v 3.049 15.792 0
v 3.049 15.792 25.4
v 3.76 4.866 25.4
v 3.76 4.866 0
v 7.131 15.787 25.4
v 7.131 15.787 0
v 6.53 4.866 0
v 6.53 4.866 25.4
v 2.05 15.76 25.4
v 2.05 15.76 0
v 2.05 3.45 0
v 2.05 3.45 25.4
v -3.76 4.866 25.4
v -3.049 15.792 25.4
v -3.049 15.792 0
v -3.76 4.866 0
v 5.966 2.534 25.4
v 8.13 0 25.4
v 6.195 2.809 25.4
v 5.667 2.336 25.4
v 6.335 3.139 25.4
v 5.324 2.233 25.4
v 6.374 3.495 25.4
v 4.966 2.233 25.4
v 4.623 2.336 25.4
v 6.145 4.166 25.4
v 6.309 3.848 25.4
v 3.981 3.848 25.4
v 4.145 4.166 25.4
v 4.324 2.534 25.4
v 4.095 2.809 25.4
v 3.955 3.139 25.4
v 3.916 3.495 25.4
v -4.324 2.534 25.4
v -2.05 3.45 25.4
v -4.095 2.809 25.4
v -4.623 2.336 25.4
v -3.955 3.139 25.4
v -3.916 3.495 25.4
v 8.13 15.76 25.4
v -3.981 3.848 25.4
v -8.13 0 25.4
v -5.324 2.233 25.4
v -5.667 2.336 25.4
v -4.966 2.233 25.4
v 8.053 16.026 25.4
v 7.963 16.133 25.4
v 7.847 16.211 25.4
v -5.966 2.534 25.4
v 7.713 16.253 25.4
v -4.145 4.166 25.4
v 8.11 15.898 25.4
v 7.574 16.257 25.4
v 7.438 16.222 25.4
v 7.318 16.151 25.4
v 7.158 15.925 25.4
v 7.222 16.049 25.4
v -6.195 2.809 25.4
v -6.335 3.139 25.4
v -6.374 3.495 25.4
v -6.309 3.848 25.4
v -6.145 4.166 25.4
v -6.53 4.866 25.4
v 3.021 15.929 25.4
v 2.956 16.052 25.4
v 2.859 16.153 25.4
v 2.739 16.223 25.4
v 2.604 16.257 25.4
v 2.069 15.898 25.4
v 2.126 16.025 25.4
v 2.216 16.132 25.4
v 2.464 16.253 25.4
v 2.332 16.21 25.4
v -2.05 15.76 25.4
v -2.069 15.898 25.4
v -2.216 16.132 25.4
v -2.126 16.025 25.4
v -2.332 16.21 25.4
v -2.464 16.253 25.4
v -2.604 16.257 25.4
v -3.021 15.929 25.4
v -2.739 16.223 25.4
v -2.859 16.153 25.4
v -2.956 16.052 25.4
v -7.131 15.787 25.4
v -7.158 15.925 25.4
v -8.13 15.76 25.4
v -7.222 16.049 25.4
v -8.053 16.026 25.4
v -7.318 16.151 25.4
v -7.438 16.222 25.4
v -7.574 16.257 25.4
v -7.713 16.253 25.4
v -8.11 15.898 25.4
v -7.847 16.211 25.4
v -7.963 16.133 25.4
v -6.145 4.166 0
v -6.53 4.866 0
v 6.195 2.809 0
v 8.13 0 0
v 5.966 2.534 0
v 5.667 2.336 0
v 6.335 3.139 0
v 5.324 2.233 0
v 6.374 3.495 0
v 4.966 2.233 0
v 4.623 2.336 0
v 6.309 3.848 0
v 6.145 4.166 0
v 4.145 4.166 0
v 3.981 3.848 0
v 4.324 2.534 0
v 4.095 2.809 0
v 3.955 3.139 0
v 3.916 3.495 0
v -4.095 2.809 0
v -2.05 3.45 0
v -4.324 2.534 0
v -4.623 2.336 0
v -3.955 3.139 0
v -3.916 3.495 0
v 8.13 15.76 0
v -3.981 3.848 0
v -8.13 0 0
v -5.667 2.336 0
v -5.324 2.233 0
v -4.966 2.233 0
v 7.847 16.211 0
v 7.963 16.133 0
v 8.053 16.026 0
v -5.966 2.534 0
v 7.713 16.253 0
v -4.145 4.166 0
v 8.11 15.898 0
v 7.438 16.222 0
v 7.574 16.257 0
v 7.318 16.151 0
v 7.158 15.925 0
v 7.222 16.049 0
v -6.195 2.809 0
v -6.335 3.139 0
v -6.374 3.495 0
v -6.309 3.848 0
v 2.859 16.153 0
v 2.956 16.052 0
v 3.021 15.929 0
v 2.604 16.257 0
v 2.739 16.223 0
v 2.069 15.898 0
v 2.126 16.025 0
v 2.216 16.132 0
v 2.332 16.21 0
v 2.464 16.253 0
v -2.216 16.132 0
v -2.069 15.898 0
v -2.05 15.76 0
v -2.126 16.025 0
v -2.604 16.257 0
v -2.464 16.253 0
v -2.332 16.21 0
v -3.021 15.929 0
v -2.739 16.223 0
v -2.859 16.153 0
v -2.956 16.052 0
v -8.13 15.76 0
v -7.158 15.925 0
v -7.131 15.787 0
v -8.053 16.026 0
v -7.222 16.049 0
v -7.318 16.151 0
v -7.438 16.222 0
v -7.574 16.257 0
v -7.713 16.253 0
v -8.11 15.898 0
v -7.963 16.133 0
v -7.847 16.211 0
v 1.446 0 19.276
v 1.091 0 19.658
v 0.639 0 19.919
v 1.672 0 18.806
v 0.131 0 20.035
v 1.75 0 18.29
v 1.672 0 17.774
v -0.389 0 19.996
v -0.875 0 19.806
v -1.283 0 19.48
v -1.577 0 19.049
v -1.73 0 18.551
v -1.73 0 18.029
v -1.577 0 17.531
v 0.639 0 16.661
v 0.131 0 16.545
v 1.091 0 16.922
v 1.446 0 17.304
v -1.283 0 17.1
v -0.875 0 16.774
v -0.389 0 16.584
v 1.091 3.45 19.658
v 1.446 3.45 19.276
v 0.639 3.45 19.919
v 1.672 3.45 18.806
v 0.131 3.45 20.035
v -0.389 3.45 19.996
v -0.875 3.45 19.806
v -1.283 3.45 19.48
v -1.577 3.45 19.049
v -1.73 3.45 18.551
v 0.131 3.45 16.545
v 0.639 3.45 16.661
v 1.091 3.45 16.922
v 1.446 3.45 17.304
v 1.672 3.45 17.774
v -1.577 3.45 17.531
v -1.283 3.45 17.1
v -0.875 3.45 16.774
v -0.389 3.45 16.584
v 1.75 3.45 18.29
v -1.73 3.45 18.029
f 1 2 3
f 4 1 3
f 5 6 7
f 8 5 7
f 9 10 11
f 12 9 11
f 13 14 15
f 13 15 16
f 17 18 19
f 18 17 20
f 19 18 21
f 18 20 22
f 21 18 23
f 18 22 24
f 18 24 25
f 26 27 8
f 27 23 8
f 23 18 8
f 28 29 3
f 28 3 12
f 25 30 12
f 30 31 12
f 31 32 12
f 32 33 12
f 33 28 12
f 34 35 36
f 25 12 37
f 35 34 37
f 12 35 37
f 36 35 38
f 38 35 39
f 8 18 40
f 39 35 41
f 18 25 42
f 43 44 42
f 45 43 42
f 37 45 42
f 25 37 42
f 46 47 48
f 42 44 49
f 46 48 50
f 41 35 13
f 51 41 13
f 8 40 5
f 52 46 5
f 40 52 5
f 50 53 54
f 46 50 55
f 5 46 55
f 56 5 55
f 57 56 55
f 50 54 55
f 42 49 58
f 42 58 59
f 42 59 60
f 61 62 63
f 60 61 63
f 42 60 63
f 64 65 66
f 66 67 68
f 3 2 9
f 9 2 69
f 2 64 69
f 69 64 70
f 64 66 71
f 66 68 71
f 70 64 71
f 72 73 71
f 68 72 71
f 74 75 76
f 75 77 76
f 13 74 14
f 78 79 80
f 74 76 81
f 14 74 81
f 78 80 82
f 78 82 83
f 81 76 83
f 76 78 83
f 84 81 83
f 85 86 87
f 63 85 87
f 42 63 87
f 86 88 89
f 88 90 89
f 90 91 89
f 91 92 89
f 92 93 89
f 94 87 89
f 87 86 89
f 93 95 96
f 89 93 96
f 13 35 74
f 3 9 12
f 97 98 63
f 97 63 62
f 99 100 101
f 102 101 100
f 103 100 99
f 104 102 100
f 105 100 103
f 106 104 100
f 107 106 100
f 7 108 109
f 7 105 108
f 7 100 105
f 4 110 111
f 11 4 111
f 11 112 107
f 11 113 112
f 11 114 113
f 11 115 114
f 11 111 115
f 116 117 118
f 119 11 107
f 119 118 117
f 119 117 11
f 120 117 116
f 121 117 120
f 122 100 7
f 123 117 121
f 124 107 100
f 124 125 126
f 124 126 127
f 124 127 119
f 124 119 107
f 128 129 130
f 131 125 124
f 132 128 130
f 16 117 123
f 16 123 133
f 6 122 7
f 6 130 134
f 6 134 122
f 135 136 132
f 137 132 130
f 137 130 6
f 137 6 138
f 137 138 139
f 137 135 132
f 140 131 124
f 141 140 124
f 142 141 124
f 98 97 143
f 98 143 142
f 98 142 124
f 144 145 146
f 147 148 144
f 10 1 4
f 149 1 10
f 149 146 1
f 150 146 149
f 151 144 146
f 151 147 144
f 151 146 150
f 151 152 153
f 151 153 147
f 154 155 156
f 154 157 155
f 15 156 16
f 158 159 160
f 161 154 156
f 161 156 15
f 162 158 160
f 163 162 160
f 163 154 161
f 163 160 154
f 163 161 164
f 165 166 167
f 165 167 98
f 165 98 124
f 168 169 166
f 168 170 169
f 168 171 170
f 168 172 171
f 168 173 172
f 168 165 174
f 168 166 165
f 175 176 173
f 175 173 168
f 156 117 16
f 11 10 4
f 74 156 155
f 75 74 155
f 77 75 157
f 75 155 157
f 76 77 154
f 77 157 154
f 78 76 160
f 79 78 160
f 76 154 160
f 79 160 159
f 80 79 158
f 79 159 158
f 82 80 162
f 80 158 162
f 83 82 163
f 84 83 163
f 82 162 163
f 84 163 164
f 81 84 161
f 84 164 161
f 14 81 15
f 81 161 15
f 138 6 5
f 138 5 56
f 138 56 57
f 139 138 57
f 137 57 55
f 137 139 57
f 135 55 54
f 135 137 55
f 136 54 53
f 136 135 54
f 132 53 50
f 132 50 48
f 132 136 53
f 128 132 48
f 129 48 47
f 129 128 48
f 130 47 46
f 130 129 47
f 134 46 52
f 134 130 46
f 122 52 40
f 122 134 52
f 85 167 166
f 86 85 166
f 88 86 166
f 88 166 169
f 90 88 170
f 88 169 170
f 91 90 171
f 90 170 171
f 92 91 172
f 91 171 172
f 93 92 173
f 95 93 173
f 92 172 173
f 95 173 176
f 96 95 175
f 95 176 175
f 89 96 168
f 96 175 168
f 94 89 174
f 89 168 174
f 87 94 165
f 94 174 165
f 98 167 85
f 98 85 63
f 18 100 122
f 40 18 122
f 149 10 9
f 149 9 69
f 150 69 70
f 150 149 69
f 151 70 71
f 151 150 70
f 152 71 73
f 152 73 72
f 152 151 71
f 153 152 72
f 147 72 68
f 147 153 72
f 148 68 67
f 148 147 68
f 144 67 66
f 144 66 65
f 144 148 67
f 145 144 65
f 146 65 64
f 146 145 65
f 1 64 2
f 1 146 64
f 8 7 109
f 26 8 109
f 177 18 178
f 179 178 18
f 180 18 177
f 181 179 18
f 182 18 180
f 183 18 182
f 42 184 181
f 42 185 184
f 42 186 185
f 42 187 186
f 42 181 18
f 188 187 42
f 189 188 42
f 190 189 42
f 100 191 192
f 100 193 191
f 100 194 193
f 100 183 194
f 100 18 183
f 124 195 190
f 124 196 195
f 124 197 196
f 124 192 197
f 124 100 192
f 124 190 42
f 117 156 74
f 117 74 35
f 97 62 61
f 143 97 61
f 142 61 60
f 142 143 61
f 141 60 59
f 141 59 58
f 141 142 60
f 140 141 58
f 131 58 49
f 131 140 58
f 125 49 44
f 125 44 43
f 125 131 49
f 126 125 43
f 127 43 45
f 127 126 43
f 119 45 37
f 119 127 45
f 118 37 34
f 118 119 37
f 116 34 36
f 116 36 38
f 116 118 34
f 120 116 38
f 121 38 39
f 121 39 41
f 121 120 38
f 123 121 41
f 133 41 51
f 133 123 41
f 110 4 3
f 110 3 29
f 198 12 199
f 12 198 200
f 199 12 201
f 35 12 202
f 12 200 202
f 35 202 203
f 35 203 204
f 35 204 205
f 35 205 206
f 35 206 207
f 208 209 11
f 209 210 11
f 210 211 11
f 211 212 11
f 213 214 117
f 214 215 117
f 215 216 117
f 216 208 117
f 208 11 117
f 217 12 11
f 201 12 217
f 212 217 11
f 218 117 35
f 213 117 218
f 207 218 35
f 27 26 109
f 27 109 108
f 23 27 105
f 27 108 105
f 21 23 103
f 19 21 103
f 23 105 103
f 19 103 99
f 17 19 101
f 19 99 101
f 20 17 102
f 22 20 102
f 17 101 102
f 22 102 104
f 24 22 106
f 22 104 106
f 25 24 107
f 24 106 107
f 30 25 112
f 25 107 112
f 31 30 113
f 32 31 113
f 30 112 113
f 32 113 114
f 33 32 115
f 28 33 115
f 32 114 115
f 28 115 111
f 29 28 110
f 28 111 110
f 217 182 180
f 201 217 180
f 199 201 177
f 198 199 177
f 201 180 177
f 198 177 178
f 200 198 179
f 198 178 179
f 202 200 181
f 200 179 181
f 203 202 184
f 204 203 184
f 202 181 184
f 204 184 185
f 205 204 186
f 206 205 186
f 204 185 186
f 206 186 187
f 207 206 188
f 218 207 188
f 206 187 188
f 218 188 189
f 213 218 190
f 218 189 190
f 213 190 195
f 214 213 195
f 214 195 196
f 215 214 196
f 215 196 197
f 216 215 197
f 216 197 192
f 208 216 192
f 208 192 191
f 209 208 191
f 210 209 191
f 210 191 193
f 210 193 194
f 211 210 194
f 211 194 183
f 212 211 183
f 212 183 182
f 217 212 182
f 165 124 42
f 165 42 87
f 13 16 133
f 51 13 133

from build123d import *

# Parameters (mm, degrees)
PAD_DEPTH       = 25.4
SKETCH002_R     = 1.75
POCKET001_DEPTH = 16.261


with BuildPart() as part:
    # Sketch → Pad (new body)
    with BuildSketch(Plane.XY):
        with BuildLine():
            Line((-8.13, 0), (0, 0))
            Line((0, 0), (0, 3.45))
            Line((-2.05, 3.45), (0, 3.45))
            Line((-2.05, 15.76), (-2.05, 3.45))
            ThreePointArc((-2.05, 15.76), (-2.533756, 16.259736), (-3.048945, 15.79247))
            Line((-3.048945, 15.79247), (-3.76, 4.86617))
            Line((-3.76, 4.86617), (-4.145, 4.16617))
            ThreePointArc((-6.145, 4.16617), (-5.145, 2.22), (-4.145, 4.16617))
            Line((-6.53, 4.86617), (-6.145, 4.16617))
            Line((-7.130755, 15.787462), (-6.53, 4.86617))
            ThreePointArc((-7.130755, 15.787462), (-7.643736, 16.259811), (-8.13, 15.76))
            Line((-8.13, 0), (-8.13, 15.76))
        make_face()
    pad = extrude(amount=PAD_DEPTH)

    # Mirrored: Pad across Sketch V_Axis
    add(pad.mirror(Plane(origin=(0, 0, 0), x_dir=(0, 0, 1), z_dir=(1, 0, 0))))

    # Sketch002 → Pocket001 (cut, through all)
    with BuildSketch(Plane.XZ):
        with Locations((0, 18.29)):
            Circle(SKETCH002_R)
    extrude(amount=-POCKET001_DEPTH, mode=Mode.SUBTRACT)


solid = part.part
